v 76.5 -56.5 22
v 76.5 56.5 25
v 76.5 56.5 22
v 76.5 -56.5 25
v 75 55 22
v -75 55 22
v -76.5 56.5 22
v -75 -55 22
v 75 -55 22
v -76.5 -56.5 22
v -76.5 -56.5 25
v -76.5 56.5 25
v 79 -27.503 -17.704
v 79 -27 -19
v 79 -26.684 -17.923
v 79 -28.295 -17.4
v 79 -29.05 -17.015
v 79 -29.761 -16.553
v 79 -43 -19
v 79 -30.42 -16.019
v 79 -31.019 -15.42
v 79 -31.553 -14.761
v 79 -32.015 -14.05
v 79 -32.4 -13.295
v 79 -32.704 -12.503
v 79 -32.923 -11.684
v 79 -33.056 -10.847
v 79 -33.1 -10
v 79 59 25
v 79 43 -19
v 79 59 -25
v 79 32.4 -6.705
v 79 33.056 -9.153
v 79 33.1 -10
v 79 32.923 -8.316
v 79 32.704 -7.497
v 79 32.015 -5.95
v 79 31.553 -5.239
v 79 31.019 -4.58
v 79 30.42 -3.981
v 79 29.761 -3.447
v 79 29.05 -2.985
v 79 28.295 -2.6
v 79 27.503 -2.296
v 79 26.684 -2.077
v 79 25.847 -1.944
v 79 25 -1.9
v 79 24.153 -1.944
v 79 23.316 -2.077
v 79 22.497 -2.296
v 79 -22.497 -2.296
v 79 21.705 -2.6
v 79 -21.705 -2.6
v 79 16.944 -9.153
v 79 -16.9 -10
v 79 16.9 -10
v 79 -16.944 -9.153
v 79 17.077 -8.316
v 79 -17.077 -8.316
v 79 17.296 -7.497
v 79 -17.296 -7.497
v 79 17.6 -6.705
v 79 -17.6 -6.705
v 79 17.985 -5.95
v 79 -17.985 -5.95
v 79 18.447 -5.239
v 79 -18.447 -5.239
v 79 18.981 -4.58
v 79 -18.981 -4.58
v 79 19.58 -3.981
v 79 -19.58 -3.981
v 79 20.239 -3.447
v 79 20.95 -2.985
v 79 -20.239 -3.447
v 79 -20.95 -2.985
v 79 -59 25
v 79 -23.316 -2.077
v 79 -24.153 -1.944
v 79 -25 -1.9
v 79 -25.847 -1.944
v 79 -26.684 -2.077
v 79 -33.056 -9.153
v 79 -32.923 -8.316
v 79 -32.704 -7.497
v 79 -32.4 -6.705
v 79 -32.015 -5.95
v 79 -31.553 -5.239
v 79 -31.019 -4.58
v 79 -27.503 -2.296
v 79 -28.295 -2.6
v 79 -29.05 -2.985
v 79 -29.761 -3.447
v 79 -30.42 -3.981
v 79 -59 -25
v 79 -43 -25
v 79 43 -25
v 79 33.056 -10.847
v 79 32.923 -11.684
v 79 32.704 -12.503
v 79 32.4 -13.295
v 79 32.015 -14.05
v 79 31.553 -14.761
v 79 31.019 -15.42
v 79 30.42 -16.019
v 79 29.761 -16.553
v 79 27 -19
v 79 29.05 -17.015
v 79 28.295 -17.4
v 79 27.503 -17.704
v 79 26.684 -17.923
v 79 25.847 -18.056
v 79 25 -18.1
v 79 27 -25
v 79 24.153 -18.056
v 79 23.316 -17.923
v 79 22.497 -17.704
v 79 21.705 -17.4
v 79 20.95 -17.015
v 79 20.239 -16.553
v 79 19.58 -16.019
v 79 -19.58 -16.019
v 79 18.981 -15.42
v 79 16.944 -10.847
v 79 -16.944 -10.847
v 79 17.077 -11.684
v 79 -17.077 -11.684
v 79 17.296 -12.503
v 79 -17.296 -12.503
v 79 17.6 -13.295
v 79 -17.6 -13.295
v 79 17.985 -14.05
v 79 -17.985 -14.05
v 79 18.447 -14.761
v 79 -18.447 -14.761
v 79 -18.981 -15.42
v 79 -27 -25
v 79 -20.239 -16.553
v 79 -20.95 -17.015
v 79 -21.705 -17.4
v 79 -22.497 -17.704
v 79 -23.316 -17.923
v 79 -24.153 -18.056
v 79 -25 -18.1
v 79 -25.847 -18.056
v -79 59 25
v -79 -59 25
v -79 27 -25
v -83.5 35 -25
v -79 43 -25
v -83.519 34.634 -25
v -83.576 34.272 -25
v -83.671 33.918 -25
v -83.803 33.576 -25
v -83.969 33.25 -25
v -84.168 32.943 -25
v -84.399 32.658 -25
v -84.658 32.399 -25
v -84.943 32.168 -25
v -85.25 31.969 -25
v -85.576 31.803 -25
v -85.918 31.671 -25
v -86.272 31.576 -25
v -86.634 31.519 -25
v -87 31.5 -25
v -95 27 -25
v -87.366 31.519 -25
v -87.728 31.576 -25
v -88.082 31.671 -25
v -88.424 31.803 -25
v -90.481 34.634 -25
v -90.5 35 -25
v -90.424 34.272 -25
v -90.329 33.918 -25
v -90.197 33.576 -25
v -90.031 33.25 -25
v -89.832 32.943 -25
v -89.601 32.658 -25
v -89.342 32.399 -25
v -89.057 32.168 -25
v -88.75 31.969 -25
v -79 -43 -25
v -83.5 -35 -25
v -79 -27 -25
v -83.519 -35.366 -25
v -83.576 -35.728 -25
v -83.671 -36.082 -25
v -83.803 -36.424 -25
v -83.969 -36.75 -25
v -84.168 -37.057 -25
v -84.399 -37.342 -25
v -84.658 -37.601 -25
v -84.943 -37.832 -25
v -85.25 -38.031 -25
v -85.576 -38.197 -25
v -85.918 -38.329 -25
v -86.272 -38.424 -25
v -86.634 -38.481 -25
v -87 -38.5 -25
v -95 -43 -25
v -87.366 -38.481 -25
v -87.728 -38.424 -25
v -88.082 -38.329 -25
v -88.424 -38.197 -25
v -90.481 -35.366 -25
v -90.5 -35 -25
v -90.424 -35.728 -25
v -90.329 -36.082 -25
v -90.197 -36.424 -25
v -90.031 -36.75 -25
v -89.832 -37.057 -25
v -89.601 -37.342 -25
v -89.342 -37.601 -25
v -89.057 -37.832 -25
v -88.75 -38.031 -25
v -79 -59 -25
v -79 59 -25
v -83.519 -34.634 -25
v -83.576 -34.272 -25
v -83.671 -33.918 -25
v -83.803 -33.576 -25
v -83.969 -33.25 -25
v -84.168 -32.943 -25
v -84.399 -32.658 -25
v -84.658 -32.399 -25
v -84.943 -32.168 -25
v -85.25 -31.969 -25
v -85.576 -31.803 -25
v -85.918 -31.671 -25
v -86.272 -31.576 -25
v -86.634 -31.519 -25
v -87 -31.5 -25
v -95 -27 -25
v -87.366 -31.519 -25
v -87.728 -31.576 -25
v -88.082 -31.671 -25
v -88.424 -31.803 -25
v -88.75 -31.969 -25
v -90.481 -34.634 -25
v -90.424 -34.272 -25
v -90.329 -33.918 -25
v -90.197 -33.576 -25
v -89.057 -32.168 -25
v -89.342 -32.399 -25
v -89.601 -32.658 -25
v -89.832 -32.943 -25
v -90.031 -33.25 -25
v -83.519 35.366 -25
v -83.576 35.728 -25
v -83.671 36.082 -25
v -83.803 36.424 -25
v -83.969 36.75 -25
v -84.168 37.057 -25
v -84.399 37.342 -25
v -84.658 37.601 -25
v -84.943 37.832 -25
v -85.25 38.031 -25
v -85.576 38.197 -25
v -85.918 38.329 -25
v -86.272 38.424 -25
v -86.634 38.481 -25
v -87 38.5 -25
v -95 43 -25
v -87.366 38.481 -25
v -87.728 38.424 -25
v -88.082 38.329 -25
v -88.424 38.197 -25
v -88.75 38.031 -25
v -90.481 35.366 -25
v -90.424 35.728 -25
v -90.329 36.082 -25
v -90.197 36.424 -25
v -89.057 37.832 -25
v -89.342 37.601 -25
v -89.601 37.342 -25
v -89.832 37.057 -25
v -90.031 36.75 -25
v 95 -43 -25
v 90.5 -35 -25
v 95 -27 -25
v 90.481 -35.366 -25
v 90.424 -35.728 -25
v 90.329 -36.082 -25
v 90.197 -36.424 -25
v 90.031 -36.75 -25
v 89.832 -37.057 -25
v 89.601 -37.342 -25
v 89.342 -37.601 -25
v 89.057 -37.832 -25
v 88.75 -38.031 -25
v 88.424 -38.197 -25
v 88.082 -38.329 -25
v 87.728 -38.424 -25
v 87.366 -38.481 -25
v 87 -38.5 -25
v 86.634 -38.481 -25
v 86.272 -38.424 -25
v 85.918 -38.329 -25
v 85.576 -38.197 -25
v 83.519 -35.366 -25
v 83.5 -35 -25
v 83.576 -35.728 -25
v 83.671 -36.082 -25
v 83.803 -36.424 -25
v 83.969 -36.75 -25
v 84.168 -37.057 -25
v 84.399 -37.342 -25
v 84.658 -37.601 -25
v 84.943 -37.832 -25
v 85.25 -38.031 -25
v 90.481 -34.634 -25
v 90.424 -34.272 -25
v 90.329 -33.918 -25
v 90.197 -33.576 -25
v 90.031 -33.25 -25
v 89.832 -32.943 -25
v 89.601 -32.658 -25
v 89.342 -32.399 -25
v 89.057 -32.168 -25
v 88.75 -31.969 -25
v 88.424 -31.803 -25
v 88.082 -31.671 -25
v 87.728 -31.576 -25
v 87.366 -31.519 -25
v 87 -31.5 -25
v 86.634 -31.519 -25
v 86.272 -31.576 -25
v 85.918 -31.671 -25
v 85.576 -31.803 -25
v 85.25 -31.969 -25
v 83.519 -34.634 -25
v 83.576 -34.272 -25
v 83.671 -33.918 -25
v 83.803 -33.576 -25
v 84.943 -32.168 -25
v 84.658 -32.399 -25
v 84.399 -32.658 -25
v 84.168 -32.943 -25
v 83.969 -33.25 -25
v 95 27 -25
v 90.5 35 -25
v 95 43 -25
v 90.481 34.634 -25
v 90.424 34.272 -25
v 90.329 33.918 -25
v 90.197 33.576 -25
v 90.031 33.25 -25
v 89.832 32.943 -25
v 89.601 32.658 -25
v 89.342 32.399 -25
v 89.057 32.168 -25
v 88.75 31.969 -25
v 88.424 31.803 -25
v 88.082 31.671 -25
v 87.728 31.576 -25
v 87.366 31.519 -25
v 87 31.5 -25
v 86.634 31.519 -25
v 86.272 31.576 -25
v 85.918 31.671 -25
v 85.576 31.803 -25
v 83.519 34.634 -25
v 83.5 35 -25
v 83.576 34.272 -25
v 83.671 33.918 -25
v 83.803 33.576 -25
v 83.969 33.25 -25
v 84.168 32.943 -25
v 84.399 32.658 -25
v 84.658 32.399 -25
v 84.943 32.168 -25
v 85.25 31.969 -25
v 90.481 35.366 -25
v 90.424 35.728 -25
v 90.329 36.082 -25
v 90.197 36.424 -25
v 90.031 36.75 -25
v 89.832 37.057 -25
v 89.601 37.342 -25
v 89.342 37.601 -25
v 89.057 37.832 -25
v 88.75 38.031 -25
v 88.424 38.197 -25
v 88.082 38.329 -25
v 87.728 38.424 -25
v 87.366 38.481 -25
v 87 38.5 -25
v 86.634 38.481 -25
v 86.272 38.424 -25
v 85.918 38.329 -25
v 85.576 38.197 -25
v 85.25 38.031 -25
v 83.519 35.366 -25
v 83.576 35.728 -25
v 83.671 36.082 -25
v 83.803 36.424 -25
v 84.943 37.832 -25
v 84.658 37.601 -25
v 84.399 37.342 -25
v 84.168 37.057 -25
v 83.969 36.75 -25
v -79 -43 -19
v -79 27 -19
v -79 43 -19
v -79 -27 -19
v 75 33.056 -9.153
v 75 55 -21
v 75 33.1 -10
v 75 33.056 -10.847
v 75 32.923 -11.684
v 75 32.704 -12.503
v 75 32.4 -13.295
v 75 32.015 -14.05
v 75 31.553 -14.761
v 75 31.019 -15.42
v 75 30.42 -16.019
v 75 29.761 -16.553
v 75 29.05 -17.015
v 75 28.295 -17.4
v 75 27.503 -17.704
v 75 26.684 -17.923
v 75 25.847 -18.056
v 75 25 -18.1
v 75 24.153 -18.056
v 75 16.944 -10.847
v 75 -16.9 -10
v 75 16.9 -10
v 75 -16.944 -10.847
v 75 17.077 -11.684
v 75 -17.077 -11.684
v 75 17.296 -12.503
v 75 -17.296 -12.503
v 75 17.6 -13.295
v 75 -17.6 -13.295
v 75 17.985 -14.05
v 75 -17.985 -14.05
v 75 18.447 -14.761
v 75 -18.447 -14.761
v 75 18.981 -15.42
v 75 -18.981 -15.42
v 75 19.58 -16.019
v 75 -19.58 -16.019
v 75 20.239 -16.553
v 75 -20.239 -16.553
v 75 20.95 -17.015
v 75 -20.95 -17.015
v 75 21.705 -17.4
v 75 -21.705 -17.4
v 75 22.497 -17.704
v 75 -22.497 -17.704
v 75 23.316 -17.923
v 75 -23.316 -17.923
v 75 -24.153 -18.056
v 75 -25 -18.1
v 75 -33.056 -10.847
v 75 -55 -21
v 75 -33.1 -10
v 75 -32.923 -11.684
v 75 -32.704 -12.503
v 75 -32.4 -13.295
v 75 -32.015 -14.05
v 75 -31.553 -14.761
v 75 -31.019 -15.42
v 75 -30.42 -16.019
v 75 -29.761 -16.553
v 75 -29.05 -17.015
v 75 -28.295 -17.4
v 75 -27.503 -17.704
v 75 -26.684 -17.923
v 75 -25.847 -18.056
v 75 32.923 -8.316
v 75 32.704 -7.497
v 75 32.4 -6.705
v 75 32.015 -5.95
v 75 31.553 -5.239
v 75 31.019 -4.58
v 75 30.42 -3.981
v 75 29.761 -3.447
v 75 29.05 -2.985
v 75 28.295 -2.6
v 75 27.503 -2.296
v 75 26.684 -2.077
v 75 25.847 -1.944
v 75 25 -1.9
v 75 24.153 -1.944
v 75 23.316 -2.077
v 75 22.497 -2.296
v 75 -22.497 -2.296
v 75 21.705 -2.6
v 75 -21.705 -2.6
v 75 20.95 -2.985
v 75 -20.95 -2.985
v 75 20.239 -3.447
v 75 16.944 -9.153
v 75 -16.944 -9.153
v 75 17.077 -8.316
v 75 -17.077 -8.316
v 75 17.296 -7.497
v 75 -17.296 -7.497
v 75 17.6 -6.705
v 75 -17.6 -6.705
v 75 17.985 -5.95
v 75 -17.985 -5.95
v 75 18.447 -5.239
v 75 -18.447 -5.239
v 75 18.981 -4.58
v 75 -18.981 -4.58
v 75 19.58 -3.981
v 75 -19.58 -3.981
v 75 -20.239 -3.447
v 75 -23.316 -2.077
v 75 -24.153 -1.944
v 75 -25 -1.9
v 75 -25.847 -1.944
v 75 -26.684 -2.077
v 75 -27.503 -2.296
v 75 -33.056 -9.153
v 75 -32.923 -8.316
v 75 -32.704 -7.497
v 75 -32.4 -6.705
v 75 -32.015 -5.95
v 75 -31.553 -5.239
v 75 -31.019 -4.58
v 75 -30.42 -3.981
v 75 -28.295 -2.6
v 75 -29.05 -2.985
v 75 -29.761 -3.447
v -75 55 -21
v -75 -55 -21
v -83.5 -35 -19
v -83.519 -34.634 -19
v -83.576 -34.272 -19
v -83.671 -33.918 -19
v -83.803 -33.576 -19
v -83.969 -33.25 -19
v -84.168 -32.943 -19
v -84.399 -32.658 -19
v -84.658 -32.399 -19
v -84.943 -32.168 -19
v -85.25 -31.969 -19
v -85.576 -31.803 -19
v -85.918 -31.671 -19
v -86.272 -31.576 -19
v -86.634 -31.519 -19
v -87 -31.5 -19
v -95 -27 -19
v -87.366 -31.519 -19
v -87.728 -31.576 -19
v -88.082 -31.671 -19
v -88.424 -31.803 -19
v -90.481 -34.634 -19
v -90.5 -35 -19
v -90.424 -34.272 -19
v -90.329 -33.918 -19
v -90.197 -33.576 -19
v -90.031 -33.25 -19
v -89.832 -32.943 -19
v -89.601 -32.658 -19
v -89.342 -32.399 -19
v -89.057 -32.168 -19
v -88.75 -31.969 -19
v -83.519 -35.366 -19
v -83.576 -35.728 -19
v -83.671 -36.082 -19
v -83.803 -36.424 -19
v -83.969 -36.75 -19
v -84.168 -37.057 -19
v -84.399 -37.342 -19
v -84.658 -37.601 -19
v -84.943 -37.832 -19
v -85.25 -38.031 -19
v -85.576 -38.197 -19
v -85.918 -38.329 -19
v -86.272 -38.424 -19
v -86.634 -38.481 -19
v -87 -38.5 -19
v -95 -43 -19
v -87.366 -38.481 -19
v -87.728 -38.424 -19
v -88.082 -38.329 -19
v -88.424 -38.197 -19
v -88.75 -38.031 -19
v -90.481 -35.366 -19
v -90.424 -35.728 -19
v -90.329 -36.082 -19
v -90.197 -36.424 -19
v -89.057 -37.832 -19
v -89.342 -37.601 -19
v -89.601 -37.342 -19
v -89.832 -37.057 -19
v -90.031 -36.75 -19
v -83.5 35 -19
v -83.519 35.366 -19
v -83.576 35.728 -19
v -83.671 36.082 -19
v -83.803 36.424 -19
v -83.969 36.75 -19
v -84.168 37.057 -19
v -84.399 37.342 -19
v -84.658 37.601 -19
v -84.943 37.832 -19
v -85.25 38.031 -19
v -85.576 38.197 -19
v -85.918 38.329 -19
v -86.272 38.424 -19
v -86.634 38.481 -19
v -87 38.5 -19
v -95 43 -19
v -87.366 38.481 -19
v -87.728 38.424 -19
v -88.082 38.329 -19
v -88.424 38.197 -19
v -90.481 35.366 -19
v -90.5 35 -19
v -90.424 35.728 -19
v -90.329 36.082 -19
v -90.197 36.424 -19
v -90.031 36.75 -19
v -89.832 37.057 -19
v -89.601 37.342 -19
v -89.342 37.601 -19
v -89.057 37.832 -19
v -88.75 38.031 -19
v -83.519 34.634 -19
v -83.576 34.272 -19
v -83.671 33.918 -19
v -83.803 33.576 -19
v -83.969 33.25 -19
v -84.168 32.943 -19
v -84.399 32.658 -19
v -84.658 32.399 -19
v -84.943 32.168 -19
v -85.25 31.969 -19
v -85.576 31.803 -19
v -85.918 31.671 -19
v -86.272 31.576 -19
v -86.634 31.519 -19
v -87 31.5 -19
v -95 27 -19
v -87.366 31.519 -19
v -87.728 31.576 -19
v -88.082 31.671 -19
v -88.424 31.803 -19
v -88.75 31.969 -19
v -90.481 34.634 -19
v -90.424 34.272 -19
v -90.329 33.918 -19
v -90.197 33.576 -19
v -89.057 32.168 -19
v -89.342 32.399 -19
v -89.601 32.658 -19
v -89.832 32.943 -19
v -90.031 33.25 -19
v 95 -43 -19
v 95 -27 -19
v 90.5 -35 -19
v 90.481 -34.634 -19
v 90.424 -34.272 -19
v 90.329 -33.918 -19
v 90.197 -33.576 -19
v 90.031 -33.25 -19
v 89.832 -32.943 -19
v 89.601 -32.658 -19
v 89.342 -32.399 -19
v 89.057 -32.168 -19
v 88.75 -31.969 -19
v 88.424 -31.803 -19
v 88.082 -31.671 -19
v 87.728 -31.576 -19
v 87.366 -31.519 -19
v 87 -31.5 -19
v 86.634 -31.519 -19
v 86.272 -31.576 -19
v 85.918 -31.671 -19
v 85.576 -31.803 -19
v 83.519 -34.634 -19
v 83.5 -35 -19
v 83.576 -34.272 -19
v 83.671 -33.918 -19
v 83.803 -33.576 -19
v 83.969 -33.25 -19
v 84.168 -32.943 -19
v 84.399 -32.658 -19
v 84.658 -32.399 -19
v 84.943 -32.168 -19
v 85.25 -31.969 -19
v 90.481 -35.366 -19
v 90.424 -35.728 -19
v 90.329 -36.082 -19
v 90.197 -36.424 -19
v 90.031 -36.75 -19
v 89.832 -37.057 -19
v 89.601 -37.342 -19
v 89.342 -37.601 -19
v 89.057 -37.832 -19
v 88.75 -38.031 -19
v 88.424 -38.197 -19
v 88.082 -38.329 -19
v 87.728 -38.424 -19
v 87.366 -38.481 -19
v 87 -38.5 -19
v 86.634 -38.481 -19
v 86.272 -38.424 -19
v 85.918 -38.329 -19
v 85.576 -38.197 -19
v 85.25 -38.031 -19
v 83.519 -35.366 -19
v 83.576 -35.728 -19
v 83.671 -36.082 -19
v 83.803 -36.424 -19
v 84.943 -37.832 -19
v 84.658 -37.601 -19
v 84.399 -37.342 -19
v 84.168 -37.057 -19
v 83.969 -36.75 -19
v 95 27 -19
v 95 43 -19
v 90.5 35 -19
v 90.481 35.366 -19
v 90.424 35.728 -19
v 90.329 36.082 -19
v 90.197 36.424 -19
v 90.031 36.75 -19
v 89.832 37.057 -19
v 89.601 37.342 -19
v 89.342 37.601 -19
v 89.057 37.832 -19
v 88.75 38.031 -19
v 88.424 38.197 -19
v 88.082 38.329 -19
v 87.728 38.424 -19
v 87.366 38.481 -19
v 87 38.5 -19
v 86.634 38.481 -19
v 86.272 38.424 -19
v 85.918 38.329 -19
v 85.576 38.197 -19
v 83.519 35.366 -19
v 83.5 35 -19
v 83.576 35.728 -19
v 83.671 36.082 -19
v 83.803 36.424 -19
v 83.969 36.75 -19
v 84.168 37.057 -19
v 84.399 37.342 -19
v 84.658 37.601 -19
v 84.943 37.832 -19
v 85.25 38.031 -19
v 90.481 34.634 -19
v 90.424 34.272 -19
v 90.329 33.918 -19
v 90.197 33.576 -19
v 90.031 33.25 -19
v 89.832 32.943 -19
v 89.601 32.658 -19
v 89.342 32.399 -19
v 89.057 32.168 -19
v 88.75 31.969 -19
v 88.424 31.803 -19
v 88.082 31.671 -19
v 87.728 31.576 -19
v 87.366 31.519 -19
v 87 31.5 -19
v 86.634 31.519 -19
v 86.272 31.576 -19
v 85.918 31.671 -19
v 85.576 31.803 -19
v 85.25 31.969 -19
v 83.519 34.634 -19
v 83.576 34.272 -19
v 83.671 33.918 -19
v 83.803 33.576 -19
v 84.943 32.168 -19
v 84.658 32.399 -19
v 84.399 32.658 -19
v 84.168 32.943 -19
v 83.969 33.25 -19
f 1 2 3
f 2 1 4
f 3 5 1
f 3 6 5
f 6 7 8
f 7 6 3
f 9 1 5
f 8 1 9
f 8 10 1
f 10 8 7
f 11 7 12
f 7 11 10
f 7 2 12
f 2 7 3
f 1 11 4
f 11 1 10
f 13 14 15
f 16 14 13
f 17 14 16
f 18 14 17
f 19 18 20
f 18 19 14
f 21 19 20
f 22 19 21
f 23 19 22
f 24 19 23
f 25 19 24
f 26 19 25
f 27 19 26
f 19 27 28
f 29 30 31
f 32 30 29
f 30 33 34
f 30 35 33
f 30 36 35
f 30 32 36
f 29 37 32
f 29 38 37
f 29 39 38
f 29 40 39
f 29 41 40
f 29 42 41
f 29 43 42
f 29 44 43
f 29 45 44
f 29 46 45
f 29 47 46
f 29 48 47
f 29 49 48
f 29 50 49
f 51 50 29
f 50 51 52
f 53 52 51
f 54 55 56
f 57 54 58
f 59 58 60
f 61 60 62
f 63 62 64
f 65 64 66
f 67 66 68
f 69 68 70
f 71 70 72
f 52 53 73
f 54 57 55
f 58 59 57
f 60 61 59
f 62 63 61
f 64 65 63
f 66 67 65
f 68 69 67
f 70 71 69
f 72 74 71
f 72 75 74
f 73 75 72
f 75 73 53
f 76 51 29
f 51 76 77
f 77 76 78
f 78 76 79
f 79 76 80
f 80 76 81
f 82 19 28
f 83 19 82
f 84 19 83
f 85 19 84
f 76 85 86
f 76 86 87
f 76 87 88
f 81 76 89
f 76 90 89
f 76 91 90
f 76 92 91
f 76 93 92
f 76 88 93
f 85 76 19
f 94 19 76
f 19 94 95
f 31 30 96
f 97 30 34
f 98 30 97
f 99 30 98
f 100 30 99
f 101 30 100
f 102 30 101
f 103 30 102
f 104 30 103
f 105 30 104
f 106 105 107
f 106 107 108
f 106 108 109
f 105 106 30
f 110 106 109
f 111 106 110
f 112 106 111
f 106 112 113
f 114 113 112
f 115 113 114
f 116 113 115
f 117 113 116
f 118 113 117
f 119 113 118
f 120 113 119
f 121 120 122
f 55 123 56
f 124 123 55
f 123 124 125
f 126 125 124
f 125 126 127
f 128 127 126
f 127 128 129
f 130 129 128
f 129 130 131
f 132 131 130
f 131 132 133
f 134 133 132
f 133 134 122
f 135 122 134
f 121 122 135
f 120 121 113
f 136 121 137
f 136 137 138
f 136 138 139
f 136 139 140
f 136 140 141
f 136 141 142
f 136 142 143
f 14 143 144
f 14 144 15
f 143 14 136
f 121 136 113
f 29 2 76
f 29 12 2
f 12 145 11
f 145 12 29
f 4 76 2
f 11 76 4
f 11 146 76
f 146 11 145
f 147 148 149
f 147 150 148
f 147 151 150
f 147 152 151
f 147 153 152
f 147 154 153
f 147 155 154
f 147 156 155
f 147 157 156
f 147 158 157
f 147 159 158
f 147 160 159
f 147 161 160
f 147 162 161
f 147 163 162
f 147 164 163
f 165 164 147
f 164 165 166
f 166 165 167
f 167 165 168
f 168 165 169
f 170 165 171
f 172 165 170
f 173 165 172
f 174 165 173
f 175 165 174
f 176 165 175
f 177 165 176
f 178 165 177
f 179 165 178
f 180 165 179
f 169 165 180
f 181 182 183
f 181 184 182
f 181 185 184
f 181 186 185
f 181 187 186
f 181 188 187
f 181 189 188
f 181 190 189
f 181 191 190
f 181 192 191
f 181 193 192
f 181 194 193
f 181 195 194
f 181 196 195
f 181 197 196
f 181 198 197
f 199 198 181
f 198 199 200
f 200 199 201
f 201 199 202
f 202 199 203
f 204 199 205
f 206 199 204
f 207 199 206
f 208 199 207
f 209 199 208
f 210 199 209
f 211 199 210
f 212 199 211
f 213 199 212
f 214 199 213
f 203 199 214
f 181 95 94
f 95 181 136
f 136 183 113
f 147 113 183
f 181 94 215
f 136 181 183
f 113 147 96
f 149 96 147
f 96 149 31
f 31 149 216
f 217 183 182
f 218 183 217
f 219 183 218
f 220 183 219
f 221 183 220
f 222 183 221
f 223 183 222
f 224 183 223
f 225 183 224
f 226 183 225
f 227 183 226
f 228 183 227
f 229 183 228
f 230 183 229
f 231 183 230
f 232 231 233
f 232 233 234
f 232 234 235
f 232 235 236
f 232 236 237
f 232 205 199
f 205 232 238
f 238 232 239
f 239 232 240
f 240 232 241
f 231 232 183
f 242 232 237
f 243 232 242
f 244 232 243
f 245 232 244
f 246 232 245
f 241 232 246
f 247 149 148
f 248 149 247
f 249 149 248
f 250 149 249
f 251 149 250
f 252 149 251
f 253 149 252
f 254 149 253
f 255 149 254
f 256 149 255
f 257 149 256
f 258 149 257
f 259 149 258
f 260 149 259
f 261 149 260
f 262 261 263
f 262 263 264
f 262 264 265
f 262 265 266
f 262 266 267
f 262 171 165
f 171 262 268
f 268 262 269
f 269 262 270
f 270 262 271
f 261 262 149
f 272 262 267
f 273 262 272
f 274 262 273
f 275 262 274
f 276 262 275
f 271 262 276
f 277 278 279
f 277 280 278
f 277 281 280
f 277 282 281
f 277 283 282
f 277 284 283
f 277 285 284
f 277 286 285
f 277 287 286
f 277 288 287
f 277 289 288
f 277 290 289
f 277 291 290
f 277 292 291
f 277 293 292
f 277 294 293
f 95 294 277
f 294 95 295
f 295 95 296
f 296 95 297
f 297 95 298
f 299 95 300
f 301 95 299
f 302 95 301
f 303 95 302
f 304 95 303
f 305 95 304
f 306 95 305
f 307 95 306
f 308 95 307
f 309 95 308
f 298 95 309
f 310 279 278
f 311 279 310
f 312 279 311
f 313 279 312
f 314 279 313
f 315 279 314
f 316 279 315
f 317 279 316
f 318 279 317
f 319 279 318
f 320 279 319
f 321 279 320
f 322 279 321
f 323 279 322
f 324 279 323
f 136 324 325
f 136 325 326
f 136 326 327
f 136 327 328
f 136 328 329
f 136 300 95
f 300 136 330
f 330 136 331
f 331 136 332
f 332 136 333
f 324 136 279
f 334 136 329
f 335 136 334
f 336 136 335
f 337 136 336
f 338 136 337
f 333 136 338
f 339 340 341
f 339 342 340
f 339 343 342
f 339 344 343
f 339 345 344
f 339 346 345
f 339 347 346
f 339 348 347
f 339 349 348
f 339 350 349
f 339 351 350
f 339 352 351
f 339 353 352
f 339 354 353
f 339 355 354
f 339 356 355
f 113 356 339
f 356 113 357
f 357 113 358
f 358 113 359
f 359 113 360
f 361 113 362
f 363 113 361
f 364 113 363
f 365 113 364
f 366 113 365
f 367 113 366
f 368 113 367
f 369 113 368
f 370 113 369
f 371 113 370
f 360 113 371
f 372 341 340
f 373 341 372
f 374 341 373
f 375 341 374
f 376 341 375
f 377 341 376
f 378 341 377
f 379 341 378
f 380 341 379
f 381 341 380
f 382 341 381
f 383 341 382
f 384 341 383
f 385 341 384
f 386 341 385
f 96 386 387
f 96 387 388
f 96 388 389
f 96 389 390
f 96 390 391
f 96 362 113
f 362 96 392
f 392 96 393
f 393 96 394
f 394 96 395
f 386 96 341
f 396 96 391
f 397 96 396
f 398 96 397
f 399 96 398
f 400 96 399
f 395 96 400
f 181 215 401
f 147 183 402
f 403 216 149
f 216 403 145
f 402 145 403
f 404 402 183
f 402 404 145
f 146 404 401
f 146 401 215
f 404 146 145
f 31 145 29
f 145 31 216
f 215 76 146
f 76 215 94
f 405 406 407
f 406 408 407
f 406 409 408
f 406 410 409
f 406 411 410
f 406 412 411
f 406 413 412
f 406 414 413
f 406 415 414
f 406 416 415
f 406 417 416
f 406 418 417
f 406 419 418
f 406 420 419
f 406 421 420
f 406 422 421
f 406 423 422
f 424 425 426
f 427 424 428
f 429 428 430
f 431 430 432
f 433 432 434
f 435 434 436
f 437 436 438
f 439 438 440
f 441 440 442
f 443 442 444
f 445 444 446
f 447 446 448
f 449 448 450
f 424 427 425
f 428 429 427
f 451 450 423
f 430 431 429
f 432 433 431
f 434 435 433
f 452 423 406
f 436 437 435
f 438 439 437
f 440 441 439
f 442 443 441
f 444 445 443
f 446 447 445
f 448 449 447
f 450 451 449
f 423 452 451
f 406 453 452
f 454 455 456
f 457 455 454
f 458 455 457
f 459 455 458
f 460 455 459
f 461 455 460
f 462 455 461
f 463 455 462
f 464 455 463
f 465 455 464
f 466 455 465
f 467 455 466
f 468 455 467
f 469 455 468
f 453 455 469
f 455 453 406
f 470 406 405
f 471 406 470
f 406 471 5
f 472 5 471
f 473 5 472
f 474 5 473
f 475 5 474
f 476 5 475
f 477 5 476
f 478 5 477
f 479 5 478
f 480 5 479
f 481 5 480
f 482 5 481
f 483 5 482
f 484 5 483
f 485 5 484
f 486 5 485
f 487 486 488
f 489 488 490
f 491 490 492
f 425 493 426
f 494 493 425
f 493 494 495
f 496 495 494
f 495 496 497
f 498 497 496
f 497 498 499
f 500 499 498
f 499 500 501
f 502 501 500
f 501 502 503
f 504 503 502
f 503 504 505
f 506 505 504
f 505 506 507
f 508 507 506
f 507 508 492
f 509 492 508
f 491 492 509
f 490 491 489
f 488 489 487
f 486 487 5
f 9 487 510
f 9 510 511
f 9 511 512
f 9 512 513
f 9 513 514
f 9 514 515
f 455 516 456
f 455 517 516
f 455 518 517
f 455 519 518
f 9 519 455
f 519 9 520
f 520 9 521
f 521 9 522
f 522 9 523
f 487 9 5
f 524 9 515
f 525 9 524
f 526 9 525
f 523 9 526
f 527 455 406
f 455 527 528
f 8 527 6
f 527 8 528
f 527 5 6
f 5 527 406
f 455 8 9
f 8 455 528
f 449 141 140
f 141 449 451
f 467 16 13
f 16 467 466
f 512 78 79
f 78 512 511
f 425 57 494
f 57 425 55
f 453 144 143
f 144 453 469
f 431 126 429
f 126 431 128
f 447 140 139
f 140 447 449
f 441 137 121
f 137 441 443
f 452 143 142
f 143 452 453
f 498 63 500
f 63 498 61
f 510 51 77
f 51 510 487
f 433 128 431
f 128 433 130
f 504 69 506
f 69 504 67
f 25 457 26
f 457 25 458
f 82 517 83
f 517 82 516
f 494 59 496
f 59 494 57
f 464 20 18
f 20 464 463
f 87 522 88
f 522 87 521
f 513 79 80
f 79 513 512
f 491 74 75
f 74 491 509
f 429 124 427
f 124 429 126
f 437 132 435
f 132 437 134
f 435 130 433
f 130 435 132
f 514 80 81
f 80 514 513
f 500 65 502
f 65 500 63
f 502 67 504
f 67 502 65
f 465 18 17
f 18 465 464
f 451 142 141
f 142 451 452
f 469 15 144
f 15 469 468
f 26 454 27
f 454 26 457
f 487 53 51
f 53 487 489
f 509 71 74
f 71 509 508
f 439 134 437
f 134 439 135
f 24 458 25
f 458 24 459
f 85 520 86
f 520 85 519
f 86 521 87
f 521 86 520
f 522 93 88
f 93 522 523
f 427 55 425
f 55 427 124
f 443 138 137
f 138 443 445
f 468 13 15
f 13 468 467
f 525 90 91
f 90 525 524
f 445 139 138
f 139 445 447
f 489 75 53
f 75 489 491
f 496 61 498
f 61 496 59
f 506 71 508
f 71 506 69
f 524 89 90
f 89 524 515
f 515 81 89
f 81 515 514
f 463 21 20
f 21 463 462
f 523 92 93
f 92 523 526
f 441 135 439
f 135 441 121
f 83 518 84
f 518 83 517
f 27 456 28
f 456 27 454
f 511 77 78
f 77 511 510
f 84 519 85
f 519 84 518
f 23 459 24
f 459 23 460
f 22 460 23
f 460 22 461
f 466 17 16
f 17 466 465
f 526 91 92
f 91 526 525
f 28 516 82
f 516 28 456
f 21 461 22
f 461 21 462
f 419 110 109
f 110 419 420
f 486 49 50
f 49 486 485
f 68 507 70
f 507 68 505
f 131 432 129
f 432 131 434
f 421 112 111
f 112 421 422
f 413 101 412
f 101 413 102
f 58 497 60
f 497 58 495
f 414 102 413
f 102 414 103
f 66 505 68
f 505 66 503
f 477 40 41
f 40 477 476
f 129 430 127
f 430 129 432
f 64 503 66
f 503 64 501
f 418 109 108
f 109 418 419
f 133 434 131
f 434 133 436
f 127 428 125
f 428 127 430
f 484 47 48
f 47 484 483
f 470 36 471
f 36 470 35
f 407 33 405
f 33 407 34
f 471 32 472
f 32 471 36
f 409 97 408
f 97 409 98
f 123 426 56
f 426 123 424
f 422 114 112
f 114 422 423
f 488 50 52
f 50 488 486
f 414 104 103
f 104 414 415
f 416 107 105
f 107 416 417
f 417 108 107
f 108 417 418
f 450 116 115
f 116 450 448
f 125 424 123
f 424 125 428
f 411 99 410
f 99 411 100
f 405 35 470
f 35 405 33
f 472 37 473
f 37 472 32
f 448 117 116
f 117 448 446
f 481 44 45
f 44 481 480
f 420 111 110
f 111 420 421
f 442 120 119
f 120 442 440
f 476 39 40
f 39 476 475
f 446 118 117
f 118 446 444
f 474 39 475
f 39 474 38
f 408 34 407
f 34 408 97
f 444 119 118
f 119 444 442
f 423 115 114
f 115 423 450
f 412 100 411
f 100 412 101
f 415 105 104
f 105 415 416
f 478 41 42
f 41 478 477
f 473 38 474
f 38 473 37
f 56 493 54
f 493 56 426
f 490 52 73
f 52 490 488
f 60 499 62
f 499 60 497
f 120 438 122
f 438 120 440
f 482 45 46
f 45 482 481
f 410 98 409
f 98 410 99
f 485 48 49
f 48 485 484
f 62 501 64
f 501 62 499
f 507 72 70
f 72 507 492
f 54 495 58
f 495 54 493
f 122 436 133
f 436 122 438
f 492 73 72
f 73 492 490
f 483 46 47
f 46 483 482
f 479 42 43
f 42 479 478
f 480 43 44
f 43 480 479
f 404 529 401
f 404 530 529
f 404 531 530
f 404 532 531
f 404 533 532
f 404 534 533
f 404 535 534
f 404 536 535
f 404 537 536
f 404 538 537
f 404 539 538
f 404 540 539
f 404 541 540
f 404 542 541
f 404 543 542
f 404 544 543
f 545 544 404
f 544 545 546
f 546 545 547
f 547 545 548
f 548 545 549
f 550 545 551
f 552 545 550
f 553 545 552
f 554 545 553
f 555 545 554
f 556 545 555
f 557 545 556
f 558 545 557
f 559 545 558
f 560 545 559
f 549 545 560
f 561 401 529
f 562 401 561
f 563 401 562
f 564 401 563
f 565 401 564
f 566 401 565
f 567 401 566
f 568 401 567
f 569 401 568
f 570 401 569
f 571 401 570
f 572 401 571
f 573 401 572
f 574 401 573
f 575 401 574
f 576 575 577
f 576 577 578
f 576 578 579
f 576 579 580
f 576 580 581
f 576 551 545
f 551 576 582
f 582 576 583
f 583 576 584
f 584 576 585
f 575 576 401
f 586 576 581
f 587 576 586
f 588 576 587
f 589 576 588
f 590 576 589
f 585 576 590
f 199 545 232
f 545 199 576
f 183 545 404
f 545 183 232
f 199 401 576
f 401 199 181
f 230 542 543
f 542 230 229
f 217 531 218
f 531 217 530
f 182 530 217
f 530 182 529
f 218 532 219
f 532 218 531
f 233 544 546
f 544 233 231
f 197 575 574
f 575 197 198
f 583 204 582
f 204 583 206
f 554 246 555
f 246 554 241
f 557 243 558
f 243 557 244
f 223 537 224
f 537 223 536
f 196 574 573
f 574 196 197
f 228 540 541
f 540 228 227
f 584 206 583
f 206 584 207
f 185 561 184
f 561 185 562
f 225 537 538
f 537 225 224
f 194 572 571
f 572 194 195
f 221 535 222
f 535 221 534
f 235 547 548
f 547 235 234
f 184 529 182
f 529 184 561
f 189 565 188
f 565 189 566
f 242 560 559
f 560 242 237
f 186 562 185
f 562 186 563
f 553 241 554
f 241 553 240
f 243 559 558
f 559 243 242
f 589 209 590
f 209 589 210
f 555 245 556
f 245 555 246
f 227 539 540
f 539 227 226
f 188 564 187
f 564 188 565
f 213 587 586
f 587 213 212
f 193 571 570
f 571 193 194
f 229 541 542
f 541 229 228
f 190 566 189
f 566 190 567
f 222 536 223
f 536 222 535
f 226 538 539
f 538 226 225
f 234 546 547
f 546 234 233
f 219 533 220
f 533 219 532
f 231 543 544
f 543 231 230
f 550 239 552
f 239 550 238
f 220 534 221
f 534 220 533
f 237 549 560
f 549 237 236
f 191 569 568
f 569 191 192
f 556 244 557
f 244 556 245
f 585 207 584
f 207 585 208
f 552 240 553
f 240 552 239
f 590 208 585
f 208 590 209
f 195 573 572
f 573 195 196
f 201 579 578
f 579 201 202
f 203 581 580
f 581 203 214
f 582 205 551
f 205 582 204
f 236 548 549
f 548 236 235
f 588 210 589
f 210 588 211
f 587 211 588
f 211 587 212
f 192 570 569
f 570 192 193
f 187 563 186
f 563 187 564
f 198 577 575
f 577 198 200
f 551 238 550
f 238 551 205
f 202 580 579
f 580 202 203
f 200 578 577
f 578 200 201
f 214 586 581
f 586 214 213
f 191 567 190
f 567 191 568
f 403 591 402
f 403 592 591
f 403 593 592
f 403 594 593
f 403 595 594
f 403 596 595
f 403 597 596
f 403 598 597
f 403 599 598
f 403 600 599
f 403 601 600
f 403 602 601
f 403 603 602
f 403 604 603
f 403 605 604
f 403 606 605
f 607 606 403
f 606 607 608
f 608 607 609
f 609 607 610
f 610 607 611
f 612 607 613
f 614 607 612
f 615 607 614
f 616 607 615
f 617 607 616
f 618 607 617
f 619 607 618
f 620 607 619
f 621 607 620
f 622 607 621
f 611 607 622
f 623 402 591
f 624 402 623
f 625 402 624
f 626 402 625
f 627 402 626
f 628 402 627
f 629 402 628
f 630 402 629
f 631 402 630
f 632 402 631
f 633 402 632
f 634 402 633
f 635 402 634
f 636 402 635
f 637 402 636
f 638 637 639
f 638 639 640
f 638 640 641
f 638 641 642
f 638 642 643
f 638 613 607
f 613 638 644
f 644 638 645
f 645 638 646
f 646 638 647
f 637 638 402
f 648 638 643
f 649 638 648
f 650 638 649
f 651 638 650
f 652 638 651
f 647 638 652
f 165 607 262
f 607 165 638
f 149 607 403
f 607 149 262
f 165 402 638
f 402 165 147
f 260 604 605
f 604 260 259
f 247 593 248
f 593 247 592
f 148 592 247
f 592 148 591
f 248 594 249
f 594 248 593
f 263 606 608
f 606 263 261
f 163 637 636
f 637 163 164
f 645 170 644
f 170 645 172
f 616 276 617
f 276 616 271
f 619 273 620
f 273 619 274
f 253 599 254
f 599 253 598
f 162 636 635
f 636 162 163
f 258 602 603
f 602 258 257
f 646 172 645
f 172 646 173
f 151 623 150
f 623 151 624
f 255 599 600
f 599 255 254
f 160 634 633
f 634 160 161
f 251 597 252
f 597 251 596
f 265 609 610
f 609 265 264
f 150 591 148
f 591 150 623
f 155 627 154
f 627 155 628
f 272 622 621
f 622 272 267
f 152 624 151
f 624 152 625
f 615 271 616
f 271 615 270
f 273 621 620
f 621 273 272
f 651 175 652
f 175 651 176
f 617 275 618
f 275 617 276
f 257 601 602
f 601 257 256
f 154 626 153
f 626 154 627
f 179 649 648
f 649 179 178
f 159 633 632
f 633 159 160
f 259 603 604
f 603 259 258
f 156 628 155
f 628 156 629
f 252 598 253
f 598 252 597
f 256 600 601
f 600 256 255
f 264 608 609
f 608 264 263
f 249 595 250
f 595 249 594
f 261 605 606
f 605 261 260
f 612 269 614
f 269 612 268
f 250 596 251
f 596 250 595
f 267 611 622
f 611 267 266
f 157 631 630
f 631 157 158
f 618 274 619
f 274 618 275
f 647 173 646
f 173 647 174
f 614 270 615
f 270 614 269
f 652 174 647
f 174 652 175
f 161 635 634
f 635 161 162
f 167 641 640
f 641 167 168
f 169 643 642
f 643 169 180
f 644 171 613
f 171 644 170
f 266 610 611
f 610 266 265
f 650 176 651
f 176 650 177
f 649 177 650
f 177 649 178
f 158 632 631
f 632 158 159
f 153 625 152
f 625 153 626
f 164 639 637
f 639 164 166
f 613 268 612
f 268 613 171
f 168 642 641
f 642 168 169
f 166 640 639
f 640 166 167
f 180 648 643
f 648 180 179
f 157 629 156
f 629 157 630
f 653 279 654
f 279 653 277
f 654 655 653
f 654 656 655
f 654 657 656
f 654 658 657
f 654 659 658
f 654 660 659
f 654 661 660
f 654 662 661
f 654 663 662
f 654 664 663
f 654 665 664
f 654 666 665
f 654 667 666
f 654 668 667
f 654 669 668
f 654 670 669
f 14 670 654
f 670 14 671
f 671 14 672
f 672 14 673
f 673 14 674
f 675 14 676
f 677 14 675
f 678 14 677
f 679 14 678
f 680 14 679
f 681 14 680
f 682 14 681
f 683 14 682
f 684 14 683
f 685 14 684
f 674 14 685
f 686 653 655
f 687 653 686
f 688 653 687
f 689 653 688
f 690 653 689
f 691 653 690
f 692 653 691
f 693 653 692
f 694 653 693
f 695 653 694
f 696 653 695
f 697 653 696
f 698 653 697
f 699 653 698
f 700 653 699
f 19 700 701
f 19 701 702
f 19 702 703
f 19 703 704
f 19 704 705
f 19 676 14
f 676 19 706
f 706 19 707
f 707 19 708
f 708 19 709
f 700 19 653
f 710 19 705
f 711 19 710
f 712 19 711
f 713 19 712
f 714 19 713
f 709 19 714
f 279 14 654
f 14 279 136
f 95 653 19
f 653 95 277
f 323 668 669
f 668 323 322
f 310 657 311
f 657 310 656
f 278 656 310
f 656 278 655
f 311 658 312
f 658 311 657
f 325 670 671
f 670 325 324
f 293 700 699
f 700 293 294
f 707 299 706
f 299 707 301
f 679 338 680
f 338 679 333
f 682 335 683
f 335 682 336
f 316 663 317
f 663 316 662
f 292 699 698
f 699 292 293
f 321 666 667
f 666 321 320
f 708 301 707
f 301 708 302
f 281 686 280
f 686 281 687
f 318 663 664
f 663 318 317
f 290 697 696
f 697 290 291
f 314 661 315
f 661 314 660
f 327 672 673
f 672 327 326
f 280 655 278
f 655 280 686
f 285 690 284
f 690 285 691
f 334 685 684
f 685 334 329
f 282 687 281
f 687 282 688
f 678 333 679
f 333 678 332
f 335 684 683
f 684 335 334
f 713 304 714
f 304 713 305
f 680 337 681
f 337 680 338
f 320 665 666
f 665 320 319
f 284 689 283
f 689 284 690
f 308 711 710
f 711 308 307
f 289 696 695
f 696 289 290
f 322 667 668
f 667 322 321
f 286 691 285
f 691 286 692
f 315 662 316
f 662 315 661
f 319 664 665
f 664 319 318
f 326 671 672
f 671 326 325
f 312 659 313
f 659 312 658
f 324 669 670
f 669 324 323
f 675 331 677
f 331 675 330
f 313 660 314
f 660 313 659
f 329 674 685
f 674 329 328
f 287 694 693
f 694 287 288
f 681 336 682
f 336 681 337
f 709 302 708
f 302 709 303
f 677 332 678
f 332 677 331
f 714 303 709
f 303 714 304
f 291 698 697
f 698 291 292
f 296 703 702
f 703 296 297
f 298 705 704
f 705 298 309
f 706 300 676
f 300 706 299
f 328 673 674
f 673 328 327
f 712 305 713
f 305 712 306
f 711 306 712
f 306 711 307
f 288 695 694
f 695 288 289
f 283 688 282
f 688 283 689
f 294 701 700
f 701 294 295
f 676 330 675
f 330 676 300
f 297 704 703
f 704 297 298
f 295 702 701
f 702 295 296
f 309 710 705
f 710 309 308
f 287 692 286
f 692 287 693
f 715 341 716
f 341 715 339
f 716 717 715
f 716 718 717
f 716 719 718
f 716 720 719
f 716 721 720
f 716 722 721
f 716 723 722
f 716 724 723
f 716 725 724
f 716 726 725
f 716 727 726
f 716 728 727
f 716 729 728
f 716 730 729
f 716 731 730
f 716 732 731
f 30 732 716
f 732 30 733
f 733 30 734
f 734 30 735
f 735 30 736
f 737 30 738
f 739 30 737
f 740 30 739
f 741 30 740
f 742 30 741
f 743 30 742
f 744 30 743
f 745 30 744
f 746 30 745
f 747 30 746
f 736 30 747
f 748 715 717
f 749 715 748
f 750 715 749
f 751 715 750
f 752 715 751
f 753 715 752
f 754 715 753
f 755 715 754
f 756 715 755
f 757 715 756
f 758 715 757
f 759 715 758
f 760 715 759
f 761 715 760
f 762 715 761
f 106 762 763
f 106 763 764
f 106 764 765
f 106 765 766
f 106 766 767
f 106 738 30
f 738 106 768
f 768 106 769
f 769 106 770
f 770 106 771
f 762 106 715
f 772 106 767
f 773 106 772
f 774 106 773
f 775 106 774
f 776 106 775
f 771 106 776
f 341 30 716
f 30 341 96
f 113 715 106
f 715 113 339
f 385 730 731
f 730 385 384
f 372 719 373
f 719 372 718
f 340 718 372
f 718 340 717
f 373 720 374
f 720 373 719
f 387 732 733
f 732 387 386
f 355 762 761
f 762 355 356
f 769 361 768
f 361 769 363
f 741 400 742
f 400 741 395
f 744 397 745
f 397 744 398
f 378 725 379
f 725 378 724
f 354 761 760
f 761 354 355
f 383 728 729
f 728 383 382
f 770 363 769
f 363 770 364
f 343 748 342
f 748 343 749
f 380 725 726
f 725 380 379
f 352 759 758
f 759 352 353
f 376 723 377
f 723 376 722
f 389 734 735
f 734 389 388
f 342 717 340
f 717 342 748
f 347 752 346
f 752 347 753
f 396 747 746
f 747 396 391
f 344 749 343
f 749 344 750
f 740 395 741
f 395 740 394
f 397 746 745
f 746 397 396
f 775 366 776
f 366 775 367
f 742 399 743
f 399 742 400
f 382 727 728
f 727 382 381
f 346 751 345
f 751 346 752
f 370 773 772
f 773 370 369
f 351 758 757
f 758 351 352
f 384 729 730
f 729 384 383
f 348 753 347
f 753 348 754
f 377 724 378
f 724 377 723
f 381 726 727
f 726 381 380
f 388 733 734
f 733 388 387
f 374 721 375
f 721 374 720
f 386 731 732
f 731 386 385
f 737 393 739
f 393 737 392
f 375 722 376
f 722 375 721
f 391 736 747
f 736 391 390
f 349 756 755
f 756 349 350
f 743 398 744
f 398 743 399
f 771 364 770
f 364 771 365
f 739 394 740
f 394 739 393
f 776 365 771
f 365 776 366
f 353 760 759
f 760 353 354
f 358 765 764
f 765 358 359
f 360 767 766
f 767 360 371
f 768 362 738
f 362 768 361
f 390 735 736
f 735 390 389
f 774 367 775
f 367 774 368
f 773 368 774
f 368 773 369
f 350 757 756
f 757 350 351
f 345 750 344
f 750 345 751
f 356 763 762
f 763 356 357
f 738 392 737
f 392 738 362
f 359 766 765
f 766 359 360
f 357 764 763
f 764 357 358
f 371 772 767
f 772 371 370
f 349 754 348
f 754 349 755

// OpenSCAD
// UNIVAC IX Smart Farm Mechanical Device: Weatherproof Controller Chassis
// Integrates an environmental seal groove and watertight gland openings

$fn = 60;
box_w = 110;
box_l = 150;
box_h = 50;
wall_t = 4;
gasket_w = 3;
gasket_d = 2.5;

module weatherproof_base_housing() {
    difference() {
        // Main external body block
        cube([box_l + (wall_t*2), box_w + (wall_t*2), box_h], center=true);
        
        // Internal component void
        translate([0, 0, wall_t]) 
            cube([box_l, box_w, box_h], center=true);
            
        // Tongue-and-Groove Environmental Gasket Track along the top rim
        translate([0, 0, (box_h/2) - (gasket_d/2)])
            difference() {
                cube([box_l + (gasket_w), box_w + (gasket_w), gasket_d + 1], center=true);
                cube([box_l - (gasket_w), box_w - (gasket_w), gasket_d + 3], center=true);
            }
            
        // Watertight PG9 / PG11 Cable Gland Entry Ports (Side walls)
        translate([(box_l/2) + wall_t, -25, -10]) rotate([0, 90, 0]) cylinder(h=20, r=8.1, center=true); // Port A
        translate([(box_l/2) + wall_t, 25, -10]) rotate([0, 90, 0]) cylinder(h=20, r=8.1, center=true);  // Port B
    }
}

module heavy_wood_mounting_tabs() {
    // Structural exterior tabs to screw the sealed unit directly into wooden framing
    for (x = [-(box_l/2)-12, (box_l/2)+12]) {
        for (y = [-35, 35]) {
            translate([x, y, -(box_h/2) + 3]) {
                difference() {
                    cube([16, 16, 6], center=true);
                    cylinder(h=10, r=3.5, center=true); // Timber fastener hole
                }
            }
        }
    }
}

// Render the environmental assembly
color("Charcoal") weatherproof_base_housing();
color("DarkSienna") heavy_wood_mounting_tabs();
